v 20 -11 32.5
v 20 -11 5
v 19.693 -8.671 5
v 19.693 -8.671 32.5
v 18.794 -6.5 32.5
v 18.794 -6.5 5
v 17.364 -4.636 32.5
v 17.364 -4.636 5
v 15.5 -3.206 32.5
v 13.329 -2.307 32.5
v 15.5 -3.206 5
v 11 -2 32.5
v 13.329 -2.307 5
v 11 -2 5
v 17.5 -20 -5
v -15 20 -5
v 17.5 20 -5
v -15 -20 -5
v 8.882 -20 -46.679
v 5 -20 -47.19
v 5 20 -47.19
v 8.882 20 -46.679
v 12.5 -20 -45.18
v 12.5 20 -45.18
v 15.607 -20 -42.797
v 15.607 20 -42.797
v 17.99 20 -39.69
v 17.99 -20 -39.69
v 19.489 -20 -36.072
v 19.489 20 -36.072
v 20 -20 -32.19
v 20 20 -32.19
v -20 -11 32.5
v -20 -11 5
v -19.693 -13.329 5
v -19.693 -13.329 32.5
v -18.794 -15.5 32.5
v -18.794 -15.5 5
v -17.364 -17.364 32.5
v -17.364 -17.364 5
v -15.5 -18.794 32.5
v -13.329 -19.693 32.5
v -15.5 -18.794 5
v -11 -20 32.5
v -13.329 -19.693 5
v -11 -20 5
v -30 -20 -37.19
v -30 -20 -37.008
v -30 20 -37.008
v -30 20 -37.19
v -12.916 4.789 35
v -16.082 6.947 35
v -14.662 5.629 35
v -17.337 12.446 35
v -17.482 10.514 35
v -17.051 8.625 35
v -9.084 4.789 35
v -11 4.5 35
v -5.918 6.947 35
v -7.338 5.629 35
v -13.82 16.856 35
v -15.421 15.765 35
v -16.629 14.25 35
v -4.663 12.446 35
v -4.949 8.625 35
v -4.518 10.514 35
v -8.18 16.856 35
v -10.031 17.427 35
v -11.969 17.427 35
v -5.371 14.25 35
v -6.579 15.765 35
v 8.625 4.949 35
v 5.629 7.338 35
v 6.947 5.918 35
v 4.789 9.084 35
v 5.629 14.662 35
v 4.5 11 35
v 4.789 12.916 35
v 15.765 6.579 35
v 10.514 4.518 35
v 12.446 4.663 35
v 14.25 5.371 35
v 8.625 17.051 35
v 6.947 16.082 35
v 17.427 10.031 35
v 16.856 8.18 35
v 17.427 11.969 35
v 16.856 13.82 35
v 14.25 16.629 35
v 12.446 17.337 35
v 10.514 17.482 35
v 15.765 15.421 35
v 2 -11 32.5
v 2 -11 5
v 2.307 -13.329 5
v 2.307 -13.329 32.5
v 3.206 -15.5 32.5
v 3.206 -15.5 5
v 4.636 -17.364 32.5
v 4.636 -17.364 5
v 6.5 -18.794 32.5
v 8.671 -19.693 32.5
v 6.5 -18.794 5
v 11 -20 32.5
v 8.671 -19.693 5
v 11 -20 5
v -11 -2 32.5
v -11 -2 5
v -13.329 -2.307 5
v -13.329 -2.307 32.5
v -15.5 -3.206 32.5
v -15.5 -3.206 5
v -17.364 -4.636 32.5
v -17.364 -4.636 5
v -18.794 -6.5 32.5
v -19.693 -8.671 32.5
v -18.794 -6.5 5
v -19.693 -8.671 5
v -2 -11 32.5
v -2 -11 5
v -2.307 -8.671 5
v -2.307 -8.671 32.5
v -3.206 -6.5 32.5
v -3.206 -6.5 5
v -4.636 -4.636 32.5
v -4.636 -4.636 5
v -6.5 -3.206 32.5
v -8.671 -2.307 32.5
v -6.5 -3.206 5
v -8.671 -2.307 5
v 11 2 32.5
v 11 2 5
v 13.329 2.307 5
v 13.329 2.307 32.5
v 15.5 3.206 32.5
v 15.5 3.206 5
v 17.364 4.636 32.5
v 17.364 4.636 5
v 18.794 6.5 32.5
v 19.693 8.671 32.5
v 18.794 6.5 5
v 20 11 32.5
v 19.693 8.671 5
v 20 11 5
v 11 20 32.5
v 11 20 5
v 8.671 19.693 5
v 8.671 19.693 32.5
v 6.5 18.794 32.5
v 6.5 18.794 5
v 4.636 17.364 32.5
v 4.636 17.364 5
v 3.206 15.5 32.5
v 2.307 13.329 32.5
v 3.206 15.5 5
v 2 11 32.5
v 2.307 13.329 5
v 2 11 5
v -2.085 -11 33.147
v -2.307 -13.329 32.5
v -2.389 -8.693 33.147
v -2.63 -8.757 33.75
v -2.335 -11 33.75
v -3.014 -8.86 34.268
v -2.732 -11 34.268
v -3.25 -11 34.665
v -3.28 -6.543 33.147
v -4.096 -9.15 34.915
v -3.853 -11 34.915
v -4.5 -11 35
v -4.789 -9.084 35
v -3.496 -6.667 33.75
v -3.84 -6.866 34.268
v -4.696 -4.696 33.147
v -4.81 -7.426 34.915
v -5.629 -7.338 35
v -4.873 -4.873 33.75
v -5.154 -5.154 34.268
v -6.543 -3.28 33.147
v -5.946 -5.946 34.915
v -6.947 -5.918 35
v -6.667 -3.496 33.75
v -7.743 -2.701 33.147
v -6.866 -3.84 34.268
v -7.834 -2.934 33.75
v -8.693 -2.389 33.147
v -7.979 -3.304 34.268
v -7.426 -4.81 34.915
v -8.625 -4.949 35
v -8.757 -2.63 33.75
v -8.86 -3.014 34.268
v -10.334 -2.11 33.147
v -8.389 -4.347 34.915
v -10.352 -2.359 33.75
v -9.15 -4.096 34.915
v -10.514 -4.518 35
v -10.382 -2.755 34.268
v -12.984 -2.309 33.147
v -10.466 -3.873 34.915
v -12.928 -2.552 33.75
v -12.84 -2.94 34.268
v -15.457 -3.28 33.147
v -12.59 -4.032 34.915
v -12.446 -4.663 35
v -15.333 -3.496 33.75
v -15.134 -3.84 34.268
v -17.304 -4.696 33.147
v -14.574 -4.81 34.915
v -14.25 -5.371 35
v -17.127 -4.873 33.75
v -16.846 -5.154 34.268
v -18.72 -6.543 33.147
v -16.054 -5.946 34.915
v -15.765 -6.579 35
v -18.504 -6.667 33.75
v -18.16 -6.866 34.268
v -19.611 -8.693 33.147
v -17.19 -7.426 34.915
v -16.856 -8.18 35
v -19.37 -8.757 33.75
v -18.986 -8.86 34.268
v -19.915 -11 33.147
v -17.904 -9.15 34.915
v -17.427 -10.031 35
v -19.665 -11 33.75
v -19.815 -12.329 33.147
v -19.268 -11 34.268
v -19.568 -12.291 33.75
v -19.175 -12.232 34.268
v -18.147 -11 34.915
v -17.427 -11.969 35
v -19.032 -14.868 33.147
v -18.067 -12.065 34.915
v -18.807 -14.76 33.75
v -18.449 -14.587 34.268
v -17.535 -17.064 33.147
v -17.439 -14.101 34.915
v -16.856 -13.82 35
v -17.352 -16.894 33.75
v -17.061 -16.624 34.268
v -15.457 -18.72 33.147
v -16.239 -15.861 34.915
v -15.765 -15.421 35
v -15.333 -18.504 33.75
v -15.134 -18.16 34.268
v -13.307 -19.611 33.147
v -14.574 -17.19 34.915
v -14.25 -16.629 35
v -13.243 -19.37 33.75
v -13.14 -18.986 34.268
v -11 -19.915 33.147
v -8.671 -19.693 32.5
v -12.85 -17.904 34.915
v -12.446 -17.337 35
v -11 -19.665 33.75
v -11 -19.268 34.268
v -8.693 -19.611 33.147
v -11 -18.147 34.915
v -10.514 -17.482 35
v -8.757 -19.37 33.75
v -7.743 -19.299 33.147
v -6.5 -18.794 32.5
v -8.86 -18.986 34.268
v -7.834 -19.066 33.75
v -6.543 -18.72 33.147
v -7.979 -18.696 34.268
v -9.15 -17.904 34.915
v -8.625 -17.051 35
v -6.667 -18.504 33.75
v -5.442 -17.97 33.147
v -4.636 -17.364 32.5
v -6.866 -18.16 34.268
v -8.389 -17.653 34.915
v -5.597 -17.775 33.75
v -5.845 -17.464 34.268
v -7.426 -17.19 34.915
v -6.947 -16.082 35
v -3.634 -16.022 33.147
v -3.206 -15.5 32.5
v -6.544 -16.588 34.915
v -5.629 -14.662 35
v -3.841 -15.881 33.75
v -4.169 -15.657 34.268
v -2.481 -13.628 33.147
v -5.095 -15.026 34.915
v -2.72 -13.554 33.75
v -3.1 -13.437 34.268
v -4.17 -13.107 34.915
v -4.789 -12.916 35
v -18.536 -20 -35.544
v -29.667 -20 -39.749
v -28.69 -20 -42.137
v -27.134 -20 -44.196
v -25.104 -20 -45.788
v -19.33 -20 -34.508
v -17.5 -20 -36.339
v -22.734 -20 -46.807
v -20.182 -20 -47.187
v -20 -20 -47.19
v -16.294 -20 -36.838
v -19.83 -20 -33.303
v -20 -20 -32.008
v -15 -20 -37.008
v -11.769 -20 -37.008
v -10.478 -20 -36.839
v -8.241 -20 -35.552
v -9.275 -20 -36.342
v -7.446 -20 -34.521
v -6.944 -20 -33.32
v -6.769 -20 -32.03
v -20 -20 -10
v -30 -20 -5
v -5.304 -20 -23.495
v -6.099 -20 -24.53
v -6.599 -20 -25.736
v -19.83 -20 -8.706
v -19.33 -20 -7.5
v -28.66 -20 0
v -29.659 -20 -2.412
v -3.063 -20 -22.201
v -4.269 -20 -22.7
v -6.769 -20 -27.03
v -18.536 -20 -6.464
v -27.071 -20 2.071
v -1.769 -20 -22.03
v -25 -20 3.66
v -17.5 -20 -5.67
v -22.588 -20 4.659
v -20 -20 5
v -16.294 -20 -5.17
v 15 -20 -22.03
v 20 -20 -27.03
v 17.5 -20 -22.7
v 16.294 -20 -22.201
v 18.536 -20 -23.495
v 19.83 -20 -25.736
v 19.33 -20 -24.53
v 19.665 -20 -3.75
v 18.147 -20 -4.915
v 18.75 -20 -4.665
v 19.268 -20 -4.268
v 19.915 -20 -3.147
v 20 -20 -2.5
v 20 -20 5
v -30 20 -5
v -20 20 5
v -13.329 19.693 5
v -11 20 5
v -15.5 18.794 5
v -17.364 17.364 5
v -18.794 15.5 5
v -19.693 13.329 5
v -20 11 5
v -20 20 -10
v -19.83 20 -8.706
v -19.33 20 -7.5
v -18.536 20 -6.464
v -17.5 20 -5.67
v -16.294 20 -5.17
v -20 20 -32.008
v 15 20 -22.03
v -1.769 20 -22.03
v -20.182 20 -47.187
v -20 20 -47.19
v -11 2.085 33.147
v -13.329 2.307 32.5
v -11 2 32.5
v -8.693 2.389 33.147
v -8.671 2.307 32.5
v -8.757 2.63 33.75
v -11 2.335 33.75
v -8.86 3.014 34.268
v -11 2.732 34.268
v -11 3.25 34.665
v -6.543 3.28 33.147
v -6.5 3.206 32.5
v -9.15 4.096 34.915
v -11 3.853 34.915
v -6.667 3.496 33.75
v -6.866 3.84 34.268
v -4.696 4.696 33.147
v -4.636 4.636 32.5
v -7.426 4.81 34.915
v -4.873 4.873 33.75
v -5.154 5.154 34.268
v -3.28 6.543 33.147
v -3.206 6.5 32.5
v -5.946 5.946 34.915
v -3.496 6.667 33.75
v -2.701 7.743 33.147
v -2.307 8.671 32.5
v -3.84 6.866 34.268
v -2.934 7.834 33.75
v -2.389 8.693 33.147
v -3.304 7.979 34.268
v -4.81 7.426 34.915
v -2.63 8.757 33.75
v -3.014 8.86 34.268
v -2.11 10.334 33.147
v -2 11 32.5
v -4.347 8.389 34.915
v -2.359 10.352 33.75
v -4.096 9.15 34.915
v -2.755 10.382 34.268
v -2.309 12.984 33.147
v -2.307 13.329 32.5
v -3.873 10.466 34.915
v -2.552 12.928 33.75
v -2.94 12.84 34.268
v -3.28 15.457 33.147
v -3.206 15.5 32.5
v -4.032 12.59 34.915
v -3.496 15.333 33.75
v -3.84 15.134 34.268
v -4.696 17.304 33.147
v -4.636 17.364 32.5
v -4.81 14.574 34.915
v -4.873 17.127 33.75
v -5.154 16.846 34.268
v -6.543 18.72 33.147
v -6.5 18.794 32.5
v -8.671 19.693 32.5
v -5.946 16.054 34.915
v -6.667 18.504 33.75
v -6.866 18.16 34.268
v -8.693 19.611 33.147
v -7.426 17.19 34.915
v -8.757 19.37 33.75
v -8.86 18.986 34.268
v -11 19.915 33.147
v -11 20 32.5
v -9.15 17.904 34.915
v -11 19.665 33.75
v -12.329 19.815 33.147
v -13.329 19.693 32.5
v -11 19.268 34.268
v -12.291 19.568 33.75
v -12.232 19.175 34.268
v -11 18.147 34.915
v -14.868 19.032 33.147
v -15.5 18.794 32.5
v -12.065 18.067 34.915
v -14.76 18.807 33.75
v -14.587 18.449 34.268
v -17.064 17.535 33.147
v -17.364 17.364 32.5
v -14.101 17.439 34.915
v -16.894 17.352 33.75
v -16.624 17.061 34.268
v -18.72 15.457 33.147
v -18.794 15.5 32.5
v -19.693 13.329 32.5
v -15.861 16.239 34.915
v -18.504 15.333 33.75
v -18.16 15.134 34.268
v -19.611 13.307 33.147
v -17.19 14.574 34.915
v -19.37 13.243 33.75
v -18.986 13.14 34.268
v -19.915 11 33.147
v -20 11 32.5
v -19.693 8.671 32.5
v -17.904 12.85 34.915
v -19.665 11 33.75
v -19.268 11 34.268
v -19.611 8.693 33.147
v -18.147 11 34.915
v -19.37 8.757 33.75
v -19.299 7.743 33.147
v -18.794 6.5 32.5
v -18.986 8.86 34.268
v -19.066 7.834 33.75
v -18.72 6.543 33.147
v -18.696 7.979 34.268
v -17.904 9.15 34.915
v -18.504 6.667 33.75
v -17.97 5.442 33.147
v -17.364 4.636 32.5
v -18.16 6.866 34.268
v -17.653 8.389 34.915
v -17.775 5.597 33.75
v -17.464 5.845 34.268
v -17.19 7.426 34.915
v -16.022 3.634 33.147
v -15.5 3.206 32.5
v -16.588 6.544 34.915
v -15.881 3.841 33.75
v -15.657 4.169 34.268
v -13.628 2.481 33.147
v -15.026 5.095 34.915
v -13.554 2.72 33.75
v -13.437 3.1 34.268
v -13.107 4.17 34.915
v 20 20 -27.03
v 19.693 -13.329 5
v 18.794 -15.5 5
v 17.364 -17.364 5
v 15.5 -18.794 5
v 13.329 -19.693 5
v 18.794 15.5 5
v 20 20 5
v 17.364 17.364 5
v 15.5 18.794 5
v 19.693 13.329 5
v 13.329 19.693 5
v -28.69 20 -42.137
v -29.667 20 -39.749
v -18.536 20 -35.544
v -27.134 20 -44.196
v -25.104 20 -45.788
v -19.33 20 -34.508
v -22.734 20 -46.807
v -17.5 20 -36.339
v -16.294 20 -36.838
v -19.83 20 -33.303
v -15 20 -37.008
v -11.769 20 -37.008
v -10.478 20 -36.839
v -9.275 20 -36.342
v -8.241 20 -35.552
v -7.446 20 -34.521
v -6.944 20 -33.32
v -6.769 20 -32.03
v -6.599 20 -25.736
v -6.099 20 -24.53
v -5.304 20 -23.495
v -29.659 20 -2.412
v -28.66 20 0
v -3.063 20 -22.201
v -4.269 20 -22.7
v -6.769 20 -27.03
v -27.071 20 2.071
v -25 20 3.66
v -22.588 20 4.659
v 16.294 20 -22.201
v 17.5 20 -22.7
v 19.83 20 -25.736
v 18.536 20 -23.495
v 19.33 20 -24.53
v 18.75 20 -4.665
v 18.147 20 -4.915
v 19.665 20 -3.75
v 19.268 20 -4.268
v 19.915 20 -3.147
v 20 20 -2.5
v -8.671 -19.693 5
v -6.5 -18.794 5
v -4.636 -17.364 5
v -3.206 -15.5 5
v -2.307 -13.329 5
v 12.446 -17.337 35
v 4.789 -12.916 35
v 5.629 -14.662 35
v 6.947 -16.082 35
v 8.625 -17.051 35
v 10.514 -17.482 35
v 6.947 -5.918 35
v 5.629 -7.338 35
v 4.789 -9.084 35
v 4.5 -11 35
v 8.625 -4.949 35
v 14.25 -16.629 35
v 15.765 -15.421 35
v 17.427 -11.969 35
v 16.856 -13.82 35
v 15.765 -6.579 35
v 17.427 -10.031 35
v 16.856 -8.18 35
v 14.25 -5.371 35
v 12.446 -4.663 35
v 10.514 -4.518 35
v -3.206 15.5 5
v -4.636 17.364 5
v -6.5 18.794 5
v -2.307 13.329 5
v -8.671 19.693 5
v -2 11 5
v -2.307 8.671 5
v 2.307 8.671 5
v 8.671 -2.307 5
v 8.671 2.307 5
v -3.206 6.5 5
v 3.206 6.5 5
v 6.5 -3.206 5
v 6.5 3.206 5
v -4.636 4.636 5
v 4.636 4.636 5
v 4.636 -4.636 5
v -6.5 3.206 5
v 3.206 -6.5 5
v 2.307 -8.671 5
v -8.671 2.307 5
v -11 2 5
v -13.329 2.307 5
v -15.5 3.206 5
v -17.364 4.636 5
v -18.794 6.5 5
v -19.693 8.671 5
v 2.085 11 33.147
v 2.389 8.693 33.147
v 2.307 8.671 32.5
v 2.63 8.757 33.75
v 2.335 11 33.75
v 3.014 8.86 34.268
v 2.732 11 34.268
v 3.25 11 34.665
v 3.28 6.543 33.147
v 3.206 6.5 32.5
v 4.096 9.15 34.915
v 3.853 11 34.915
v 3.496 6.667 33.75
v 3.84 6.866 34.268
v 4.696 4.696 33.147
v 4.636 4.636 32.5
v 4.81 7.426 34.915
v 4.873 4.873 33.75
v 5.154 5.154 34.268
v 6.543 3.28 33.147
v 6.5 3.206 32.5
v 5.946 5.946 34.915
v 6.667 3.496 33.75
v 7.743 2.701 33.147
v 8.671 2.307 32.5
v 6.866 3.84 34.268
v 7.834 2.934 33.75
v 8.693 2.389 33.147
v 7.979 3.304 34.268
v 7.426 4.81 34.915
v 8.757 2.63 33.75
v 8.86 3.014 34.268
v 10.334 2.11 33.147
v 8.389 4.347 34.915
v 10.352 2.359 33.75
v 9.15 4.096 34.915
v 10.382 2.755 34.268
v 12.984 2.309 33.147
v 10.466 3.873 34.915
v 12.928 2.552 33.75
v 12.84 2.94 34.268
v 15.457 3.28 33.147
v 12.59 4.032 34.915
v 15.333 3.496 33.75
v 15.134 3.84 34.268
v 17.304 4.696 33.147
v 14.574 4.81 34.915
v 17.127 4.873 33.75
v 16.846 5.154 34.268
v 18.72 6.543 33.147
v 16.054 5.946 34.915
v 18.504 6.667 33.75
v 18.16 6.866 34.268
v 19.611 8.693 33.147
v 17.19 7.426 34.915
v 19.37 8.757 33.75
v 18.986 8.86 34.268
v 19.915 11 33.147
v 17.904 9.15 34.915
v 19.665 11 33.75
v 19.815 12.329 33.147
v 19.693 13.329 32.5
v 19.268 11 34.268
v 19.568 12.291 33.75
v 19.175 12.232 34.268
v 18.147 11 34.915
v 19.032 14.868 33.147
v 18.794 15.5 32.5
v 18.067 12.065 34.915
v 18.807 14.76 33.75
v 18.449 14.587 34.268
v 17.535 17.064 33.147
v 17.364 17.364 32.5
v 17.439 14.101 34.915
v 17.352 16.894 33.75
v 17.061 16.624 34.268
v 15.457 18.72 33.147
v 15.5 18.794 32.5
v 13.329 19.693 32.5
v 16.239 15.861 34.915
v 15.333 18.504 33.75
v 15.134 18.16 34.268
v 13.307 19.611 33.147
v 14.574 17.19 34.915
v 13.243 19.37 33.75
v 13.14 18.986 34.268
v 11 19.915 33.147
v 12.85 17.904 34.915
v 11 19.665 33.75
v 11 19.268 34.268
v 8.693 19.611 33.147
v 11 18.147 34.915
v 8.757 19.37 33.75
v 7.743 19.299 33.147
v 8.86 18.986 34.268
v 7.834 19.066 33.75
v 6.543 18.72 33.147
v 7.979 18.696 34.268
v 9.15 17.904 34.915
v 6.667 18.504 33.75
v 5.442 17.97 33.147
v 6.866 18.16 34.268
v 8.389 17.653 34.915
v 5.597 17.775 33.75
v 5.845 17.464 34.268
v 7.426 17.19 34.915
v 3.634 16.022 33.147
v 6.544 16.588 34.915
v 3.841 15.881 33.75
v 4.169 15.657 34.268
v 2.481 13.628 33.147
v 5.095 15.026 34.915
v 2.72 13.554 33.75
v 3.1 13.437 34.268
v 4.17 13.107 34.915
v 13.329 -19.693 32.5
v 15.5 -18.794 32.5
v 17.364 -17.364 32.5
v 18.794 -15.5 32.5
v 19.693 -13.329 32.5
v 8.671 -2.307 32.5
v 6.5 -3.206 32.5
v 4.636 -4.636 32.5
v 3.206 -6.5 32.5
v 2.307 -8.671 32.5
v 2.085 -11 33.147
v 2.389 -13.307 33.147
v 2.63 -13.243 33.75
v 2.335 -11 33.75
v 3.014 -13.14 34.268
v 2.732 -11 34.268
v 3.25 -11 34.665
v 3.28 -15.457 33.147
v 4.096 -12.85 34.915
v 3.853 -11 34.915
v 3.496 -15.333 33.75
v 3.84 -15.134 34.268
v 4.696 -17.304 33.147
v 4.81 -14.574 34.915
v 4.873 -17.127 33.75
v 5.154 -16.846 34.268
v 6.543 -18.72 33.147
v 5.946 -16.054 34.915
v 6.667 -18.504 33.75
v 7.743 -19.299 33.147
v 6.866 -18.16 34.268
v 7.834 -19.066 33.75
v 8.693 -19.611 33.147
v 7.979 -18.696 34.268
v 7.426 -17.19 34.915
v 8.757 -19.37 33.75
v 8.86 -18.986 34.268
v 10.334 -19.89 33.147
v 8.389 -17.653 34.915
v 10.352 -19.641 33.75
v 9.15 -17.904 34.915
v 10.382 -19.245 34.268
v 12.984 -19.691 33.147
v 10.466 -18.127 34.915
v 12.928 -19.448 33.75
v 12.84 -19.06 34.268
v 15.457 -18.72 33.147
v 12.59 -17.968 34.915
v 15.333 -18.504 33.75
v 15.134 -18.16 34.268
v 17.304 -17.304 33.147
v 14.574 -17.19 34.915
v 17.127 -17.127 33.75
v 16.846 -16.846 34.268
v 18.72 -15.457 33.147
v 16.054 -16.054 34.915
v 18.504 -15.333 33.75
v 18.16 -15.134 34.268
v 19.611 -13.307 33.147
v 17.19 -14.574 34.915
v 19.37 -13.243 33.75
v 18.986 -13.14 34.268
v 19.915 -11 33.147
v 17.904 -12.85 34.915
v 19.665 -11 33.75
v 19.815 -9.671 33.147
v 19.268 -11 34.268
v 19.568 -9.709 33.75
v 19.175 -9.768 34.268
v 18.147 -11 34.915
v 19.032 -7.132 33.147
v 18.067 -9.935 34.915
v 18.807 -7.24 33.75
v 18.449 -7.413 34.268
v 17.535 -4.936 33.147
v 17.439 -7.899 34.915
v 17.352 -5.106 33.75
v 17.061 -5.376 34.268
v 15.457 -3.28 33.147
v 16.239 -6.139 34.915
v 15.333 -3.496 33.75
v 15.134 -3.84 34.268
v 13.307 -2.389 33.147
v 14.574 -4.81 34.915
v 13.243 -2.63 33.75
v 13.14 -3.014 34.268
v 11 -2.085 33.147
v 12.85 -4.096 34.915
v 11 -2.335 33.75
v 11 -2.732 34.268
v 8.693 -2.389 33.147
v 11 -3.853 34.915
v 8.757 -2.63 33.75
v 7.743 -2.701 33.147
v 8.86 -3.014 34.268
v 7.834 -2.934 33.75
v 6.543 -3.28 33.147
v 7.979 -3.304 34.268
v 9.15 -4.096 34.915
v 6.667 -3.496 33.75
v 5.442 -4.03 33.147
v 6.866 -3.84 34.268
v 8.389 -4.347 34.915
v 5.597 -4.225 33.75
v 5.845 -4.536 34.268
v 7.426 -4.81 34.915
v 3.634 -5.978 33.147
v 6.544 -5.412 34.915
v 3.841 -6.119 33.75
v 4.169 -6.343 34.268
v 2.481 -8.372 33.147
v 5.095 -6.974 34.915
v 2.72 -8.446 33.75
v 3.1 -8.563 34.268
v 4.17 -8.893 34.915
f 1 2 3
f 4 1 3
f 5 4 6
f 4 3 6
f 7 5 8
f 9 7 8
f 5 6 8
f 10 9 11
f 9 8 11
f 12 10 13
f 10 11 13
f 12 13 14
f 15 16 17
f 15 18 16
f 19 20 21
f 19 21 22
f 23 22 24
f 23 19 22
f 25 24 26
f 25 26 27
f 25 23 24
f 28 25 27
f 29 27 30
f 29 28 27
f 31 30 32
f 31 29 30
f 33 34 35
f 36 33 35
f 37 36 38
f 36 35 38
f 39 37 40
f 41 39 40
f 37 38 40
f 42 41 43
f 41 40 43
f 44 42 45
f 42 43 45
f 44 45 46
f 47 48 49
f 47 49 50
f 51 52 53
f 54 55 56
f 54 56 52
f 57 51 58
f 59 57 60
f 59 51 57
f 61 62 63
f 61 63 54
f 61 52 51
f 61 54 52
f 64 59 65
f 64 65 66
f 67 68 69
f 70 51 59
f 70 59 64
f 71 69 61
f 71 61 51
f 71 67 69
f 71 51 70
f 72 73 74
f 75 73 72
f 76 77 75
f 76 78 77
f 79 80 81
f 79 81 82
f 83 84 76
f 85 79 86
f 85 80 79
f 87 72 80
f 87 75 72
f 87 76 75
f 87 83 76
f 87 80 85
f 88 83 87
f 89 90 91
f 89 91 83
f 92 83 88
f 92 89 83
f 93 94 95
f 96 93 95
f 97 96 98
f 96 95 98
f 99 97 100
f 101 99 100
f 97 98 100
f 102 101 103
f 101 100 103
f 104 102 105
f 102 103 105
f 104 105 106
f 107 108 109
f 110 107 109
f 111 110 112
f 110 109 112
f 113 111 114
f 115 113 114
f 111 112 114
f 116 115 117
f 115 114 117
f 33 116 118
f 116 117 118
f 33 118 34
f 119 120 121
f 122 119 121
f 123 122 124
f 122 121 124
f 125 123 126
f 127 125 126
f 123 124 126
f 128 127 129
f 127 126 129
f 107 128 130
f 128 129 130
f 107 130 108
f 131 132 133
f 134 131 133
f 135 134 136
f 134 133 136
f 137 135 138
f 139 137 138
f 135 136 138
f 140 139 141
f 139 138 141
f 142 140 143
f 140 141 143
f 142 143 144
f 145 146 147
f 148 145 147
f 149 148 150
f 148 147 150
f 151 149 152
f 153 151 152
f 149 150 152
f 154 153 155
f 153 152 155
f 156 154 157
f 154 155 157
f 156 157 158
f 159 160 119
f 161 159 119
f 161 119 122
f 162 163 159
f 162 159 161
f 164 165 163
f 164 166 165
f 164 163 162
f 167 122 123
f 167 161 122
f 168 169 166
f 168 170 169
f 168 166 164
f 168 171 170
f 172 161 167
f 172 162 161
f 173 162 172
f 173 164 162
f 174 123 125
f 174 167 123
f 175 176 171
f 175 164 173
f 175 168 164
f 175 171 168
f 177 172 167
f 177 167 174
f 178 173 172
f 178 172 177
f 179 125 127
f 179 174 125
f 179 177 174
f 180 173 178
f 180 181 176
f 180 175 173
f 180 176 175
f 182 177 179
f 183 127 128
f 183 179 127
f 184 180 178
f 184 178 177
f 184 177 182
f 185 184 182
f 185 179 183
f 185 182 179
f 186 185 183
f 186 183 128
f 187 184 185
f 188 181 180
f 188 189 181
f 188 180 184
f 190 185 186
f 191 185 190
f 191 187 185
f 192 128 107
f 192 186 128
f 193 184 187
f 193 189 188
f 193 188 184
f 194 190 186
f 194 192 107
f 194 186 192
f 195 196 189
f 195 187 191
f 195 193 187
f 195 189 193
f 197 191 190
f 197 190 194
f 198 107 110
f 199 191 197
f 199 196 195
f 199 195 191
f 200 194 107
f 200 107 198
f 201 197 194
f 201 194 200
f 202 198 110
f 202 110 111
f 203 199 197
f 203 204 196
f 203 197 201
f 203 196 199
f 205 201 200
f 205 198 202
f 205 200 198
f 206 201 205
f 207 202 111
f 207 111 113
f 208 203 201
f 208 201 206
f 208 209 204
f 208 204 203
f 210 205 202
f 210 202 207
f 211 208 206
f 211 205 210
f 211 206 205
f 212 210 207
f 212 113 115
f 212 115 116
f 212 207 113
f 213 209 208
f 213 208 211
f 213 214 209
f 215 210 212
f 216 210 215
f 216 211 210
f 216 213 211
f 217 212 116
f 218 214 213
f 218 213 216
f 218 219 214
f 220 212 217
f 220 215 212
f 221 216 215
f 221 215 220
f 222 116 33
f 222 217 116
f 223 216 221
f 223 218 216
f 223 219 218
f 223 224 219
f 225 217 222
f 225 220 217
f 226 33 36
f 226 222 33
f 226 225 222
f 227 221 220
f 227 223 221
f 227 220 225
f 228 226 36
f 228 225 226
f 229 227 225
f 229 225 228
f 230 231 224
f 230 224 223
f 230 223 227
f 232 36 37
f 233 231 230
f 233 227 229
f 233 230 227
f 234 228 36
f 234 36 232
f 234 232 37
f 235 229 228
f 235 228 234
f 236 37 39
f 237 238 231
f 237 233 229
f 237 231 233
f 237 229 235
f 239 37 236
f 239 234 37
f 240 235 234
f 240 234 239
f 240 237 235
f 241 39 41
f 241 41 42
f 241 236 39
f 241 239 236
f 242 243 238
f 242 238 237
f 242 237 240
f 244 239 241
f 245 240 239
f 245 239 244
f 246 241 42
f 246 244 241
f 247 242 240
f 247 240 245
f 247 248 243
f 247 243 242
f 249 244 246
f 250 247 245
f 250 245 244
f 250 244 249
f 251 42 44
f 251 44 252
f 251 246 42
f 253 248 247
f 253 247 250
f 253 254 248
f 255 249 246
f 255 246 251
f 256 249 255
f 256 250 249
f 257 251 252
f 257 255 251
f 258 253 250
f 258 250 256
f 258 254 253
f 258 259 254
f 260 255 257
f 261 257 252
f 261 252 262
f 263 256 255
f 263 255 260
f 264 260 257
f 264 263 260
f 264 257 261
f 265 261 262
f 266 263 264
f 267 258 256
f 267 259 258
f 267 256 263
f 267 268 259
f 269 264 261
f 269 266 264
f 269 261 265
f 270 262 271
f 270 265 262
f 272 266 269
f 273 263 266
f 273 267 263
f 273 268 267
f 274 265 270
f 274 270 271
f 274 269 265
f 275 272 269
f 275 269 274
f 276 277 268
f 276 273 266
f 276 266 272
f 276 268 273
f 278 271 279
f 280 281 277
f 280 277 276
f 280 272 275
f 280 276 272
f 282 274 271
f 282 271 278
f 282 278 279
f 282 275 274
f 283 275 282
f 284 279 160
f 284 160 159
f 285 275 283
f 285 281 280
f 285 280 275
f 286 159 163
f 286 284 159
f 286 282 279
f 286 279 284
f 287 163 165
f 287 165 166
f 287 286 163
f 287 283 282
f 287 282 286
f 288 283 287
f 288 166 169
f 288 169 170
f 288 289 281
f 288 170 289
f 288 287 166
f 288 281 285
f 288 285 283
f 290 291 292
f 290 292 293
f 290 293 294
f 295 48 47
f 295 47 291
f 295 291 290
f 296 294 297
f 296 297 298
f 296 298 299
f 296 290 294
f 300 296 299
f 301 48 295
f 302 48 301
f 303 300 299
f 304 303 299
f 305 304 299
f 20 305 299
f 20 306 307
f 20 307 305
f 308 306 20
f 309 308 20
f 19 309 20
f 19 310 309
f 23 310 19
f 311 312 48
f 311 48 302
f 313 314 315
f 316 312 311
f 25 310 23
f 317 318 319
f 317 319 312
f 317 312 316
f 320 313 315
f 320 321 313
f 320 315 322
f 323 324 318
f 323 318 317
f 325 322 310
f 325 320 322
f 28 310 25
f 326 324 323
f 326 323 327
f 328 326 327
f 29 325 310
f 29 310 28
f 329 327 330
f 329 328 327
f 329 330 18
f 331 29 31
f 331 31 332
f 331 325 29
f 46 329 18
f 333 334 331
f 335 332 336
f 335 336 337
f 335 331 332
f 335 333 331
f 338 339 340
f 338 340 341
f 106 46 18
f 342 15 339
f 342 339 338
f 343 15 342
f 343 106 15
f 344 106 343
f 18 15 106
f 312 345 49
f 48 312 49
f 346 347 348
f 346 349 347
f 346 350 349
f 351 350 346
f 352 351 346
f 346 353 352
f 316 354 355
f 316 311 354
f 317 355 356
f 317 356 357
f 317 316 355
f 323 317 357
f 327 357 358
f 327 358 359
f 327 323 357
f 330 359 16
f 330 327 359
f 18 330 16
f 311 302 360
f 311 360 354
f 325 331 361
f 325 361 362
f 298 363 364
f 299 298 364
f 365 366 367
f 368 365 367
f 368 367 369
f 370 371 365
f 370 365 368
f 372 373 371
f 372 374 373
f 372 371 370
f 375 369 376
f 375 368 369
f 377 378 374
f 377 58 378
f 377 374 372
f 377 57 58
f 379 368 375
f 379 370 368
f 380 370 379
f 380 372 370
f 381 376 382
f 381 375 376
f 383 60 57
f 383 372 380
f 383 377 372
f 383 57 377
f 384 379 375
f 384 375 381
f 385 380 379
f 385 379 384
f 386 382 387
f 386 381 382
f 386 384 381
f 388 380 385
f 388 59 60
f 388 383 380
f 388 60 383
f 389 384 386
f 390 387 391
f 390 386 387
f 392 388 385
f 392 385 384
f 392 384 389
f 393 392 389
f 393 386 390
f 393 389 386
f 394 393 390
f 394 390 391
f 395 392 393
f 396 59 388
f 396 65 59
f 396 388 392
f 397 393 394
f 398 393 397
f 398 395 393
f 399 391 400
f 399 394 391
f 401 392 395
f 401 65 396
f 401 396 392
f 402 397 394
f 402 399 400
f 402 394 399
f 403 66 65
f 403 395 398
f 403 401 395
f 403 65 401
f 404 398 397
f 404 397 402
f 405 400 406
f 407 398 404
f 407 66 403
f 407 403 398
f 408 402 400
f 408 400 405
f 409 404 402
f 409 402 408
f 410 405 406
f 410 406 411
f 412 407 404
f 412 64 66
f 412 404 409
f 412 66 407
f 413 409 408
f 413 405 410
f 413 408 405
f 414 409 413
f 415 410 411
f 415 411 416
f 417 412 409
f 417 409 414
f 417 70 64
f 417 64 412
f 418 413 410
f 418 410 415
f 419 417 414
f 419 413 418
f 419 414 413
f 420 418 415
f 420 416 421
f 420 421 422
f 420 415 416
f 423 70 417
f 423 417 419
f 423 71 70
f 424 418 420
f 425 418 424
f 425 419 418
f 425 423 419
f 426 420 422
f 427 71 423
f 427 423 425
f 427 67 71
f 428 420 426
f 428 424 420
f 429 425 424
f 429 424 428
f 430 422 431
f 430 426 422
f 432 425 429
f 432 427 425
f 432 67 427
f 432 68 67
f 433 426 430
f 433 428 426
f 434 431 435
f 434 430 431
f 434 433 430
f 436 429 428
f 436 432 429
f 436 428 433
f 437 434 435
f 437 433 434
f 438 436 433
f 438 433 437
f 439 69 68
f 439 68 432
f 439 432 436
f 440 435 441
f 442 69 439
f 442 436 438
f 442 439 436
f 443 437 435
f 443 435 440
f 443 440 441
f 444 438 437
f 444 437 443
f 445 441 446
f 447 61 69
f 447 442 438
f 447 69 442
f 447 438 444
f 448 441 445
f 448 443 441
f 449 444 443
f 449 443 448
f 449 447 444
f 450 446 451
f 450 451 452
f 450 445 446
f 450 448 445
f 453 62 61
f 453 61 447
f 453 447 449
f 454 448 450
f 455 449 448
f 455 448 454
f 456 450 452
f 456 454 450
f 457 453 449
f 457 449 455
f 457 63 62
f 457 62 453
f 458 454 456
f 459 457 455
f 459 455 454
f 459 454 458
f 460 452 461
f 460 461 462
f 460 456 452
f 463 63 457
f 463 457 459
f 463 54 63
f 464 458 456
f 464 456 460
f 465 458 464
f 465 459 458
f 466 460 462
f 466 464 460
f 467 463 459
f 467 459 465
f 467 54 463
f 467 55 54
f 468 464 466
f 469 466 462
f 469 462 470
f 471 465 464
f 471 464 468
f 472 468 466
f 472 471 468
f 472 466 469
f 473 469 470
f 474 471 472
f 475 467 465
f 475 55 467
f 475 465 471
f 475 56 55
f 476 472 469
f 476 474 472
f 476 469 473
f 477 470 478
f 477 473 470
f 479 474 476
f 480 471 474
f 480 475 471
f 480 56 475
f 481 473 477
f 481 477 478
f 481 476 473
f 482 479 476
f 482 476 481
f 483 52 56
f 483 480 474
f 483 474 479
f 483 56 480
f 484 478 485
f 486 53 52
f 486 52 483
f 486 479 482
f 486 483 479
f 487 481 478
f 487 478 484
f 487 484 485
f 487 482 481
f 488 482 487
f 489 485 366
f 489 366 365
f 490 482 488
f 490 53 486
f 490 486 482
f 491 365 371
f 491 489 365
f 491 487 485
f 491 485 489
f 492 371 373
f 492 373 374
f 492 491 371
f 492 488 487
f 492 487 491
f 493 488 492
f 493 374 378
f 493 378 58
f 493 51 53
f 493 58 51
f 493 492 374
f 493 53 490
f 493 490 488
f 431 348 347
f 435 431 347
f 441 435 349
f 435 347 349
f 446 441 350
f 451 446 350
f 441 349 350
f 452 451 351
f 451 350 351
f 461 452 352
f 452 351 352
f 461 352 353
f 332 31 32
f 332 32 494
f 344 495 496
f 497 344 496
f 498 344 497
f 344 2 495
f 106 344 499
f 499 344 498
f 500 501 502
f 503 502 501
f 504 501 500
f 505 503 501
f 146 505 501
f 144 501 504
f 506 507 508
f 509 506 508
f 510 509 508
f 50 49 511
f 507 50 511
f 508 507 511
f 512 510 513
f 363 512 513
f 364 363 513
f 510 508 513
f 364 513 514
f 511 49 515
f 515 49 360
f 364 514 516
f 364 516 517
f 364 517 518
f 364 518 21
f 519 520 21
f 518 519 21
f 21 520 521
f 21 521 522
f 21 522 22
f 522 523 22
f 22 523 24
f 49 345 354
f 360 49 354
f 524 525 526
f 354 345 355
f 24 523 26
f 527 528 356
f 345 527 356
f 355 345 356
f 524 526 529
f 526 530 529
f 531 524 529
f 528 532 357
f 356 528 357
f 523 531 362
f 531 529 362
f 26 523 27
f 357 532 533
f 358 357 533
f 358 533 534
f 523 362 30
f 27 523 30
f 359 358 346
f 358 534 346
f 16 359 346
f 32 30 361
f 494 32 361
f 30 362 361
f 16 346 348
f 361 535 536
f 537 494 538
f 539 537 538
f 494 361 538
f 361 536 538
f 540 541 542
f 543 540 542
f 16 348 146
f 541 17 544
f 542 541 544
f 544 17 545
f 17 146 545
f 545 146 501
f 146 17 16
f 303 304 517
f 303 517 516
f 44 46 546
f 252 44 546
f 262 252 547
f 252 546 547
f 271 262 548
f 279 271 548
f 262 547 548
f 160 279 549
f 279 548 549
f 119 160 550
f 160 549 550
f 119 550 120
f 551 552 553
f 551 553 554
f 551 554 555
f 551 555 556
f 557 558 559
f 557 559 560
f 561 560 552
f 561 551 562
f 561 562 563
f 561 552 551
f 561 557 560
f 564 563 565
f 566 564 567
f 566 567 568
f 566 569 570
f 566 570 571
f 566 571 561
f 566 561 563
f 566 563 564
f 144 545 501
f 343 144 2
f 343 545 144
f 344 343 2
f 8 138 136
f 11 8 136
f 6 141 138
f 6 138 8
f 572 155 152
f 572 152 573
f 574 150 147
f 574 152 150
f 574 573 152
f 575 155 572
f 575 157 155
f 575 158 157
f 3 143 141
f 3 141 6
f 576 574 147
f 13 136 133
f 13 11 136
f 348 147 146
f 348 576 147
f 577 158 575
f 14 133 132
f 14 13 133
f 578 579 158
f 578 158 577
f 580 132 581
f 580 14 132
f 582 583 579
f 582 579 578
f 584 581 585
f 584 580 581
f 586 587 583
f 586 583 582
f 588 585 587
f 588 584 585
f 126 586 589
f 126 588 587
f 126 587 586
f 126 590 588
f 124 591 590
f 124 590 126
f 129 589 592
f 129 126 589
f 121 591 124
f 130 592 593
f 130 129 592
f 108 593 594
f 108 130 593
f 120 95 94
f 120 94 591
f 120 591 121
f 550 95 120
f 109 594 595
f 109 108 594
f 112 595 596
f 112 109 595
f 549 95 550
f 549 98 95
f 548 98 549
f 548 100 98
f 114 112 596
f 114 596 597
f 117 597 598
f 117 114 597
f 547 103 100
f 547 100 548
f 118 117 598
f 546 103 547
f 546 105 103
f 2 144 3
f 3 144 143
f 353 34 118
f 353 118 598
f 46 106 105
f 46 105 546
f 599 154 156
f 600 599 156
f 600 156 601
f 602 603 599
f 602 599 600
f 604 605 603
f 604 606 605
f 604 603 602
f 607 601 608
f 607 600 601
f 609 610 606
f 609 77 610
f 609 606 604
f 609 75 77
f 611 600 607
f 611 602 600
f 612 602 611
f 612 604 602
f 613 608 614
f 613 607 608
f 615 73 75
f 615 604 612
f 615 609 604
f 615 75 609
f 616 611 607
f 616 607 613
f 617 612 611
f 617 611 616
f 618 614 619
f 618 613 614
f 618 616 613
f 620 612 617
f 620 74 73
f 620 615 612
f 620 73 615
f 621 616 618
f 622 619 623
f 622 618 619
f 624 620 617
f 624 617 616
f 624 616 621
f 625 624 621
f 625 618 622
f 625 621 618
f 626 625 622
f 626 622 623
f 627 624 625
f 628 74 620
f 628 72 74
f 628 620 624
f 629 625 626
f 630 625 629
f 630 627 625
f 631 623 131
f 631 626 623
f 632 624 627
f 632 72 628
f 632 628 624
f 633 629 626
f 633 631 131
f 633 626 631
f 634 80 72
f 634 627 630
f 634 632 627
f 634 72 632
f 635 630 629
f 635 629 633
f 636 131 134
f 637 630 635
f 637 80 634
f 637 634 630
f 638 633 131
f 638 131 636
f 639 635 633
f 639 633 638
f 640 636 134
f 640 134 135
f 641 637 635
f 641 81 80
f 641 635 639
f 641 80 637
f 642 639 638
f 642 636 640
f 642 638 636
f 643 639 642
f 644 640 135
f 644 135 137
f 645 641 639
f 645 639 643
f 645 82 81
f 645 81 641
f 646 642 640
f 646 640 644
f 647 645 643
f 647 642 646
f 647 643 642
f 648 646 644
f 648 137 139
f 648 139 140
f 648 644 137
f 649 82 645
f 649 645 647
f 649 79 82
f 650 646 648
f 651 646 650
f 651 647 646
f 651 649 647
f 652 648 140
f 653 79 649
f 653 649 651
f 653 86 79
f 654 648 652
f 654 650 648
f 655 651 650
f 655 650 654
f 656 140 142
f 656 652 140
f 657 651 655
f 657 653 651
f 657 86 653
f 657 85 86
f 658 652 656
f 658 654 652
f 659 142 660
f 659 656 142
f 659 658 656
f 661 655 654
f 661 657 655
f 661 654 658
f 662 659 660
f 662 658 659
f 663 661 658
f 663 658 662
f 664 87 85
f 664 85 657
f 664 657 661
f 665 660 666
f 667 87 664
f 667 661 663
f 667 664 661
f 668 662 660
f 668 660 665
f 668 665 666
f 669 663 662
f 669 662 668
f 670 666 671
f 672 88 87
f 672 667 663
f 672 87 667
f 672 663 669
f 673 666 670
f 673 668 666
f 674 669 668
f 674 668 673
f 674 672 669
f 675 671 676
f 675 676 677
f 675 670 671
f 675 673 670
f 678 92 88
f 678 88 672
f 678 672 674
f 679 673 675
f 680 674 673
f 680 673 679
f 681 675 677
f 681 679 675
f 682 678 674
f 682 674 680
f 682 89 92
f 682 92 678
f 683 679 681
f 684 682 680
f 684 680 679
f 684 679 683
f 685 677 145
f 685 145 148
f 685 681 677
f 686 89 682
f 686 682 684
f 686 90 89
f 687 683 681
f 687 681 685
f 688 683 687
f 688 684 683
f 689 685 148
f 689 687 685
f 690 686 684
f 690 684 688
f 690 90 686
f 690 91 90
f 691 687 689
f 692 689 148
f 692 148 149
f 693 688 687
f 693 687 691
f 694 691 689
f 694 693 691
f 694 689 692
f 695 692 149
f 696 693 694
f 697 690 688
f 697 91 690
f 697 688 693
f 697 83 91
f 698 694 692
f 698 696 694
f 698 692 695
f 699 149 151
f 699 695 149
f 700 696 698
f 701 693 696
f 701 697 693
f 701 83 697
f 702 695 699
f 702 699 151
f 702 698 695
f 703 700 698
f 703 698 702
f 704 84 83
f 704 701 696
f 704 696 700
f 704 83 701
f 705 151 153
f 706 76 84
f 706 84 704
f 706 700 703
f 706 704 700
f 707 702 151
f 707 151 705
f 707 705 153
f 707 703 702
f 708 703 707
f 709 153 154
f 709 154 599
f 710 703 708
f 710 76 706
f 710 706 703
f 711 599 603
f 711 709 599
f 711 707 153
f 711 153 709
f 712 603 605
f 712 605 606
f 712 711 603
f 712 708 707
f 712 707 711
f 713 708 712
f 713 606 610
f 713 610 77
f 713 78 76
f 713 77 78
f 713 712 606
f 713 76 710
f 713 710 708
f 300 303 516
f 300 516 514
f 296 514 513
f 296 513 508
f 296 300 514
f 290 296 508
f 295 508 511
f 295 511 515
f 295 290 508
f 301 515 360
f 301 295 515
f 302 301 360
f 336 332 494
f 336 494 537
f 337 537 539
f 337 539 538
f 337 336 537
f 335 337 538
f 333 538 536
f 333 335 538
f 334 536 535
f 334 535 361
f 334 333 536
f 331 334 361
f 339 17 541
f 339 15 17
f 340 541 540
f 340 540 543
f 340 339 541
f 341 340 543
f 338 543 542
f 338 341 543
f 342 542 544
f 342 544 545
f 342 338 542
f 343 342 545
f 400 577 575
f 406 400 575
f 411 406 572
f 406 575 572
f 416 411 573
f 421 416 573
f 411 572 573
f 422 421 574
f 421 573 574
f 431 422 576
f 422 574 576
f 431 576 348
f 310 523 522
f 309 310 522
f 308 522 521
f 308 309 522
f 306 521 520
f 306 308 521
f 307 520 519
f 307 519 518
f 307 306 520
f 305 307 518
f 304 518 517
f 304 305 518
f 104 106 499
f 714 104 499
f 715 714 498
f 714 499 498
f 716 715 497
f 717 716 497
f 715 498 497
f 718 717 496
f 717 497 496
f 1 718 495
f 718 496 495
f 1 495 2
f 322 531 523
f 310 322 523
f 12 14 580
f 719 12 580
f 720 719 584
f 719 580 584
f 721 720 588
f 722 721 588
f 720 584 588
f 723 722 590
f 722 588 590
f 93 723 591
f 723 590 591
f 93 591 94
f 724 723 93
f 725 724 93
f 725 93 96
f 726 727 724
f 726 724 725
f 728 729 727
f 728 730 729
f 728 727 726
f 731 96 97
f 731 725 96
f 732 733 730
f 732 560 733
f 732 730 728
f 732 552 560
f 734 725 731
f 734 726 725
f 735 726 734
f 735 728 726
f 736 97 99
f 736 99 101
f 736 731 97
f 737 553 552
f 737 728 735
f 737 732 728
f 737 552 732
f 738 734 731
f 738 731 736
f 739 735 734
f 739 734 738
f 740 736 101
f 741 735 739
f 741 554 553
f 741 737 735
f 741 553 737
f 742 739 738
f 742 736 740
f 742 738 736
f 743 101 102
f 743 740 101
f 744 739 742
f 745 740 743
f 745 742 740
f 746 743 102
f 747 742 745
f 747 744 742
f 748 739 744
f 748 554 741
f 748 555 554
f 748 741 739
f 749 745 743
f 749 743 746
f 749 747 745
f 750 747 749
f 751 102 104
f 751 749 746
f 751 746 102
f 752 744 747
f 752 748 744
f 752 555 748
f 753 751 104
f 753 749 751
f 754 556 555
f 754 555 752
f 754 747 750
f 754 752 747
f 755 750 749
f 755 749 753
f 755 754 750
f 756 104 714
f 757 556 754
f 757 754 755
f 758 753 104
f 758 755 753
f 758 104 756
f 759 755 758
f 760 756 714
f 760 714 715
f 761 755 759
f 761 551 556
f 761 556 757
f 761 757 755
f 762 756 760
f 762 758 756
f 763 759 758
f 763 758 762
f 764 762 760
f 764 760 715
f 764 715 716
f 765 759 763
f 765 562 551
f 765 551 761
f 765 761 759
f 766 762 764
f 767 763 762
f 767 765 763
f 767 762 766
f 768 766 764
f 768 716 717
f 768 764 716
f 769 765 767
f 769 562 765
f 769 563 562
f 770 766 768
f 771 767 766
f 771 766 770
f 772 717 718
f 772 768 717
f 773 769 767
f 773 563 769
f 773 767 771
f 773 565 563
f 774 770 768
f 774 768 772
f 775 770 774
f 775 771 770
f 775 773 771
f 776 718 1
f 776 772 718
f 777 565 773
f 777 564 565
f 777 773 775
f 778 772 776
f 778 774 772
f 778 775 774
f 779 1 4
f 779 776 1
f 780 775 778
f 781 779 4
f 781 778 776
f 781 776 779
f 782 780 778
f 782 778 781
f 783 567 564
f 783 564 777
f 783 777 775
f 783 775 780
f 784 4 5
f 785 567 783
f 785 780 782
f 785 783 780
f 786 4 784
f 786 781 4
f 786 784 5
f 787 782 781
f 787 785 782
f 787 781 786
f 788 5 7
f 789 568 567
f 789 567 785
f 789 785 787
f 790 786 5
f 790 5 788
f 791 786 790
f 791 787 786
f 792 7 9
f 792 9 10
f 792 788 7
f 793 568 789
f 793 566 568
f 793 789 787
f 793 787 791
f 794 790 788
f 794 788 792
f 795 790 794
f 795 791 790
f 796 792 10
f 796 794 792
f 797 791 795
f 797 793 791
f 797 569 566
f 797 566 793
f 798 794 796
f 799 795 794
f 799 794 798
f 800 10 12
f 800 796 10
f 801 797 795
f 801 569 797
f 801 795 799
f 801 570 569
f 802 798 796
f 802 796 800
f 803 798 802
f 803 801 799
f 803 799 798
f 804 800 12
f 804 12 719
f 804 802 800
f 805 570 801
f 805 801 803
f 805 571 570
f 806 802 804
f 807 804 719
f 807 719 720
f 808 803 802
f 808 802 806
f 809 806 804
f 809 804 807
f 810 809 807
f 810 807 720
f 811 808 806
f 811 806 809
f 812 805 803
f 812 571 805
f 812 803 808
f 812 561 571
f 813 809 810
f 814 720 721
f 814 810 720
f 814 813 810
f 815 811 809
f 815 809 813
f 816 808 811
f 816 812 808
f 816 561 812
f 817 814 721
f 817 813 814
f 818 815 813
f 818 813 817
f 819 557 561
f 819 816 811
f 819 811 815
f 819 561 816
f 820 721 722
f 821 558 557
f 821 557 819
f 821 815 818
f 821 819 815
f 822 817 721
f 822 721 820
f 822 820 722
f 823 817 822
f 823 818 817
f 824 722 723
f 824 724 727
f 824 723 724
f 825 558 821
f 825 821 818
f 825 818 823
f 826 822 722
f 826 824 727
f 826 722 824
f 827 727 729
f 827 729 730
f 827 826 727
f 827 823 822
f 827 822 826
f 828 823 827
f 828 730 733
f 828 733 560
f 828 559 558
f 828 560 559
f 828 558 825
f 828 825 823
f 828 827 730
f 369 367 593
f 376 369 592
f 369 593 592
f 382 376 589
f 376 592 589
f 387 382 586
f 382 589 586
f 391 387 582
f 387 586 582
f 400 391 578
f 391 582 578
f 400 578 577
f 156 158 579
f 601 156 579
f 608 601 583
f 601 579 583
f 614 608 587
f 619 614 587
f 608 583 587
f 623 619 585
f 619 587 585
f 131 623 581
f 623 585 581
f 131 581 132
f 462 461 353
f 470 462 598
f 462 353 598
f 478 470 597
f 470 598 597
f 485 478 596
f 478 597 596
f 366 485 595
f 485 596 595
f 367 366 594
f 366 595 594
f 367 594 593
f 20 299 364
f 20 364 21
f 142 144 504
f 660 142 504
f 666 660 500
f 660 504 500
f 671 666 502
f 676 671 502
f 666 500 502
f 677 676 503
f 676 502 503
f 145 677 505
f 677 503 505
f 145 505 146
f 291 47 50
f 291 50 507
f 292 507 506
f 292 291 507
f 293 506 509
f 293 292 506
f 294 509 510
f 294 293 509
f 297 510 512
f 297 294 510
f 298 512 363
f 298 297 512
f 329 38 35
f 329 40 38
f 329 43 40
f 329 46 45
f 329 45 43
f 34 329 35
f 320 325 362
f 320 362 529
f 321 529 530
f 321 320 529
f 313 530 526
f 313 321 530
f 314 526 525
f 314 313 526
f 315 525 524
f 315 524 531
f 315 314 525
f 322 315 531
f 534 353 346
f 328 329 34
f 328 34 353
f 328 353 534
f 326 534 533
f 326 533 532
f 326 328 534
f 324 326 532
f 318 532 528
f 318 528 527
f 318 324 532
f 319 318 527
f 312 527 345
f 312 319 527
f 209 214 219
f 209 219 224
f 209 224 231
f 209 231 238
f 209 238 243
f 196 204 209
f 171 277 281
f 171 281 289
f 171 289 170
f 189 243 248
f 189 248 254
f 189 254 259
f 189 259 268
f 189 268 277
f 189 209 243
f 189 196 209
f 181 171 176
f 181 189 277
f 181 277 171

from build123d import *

# Parameters (mm, degrees)
F1_DEPTH = 20
F3_DEPTH = 30


# Not quite as in the source:
# - a fillet or chamfer that OpenCascade refuses, or shapes differently, is made with other operations: its cross-section is extruded or revolved along the edge and cut away or added
# - a feature names something its author has since deleted; it is built from what else it names


with BuildPart() as f1:
    # F0 (on Front) → F1 (new body, symmetric)
    with BuildSketch(Plane.XZ):
        with BuildLine():
            Line((-10, -5), (17.5, -5))
            ThreePointArc((17.5, -5), (19.267766953, -4.267766953), (20, -2.5))
            Line((20, -2.5), (20, 5))
            Line((20, 5), (-20, 5))
            ThreePointArc((-20, 5), (-27.0710678119, 2.0710678119), (-30, -5))
            Line((-30, -5), (-30, -37.0084848255))
            Line((-30, -37.0084848255), (-29.9999700785, -37.1900333921))
            ThreePointArc((-29.9999700785, -37.1900333921), (-27.134358967, -44.1955599538), (-20.1815186475, -47.1867371371))
            Line((-20.1815186475, -47.1867371371), (-20, -47.1900331229))
            Line((-20, -47.1900331229), (-10, -47.1900331229))
            Line((-10, -47.1900331229), (-6.8265195005, -47.1900331229))
            Line((-6.8265195005, -47.1900331229), (5, -47.1900331229))
            ThreePointArc((5, -47.1900331229), (15.6066017178, -42.7966348407), (20, -32.1900331229))
            Line((20, -32.1900331229), (20, -32.0304483175))
            Line((20, -32.0304483175), (20, -27.0304483175))
            ThreePointArc((20, -27.0304483175), (18.5355339059, -23.4949144116), (15, -22.0304483175))
            Line((15, -22.0304483175), (3.1734804995, -22.0304483175))
            Line((3.1734804995, -22.0304483175), (-1.7689520504, -22.0304483175))
            ThreePointArc((-1.7689520504, -22.0304483175), (-5.3044859563, -23.4949144116), (-6.7689520504, -27.0304483175))
            Line((-6.7689520504, -27.0304483175), (-6.7689520504, -32.0304483175))
            ThreePointArc((-6.7689520504, -32.0304483175), (-8.2410406124, -35.5516728412), (-11.7686128262, -37.0084848255))
            Line((-11.7686128262, -37.0084848255), (-15, -37.0084848255))
            ThreePointArc((-15, -37.0084848255), (-18.5355339059, -35.5440187314), (-20, -32.0084848255))
            Line((-20, -32.0084848255), (-20, -15))
            Line((-20, -15), (-20, -10))
            ThreePointArc((-20, -10), (-18.5355339059, -6.4644660941), (-15, -5))
            Line((-15, -5), (-10, -5))
        make_face()
    extrude(amount=F1_DEPTH, both=True)

    # F2 (on face) → F3 (join)
    with BuildSketch(Plane.XY.offset(5)):
        with BuildLine():
            Line((-11, 11), (-2, 11))
            ThreePointArc((-2, 11), (-4.6360389693, 17.3639610307), (-11, 20))
            Line((-11, 20), (-11, 11))
        make_face()
        with BuildLine():
            Line((-20, 11), (-11, 11))
            Line((-11, 11), (-11, 20))
            ThreePointArc((-11, 20), (-17.3639610307, 17.3639610307), (-20, 11))
        make_face()
        with BuildLine():
            ThreePointArc((-20, 11), (-17.3639610288, 4.6360389675), (-10.9999999948, 2))
            Line((-11, 2), (-11, 11))
            Line((-11, 11), (-20, 11))
        make_face()
        with BuildLine():
            Line((-11, 11), (-11, 2))
            ThreePointArc((-10.9999999948, 2), (-4.6360389675, 4.6360389712), (-2, 11))
            Line((-2, 11), (-11, 11))
        make_face()
        with BuildLine():
            ThreePointArc((11, 20), (4.6360389693, 17.3639610307), (2, 11))
            Line((2, 11), (11, 11))
            Line((11, 11), (11, 20))
        make_face()
        with BuildLine():
            Line((11, 20), (11, 11))
            Line((11, 11), (20, 11))
            ThreePointArc((20, 11), (17.3639610307, 17.3639610307), (11, 20))
        make_face()
        with BuildLine():
            Line((11, 11), (11, 2))
            ThreePointArc((11, 2), (17.3639610307, 4.6360389693), (20, 11))
            Line((20, 11), (11, 11))
        make_face()
        with BuildLine():
            ThreePointArc((2, 11), (4.6360389693, 4.6360389693), (11, 2))
            Line((11, 2), (11, 11))
            Line((11, 11), (2, 11))
        make_face()
        with BuildLine():
            ThreePointArc((11, -2), (4.6360389693, -4.6360389693), (2, -11))
            Line((2, -11), (11, -11))
            Line((11, -11), (11, -2))
        make_face()
        with BuildLine():
            Line((11, -2), (11, -11))
            Line((11, -11), (20, -11))
            ThreePointArc((20, -11), (17.3639610307, -4.6360389693), (11, -2))
        make_face()
        with BuildLine():
            Line((11, -11), (11, -20))
            ThreePointArc((11, -20), (17.3639610307, -17.3639610307), (20, -11))
            Line((20, -11), (11, -11))
        make_face()
        with BuildLine():
            Line((11, -11), (2, -11))
            ThreePointArc((2, -11), (4.6360389693, -17.3639610307), (11, -20))
            Line((11, -20), (11, -11))
        make_face()
        with BuildLine():
            ThreePointArc((-11, -20), (-4.6360389693, -17.3639610307), (-2, -11))
            Line((-2, -11), (-11, -11))
            Line((-11, -11), (-11, -20))
        make_face()
        with BuildLine():
            ThreePointArc((-20, -11), (-17.3639610307, -17.3639610307), (-11, -20))
            Line((-11, -20), (-11, -11))
            Line((-11, -11), (-20, -11))
        make_face()
        with BuildLine():
            Line((-20, -11), (-11, -11))
            Line((-11, -11), (-11, -2))
            ThreePointArc((-11, -2), (-17.3639610307, -4.6360389693), (-20, -11))
        make_face()
        with BuildLine():
            Line((-11, -11), (-2, -11))
            ThreePointArc((-2, -11), (-4.6360389693, -4.6360389693), (-11, -2))
            Line((-11, -2), (-11, -11))
        make_face()
    extrude(amount=F3_DEPTH)

    # F4: fillet of radius 2.5 on 4 edges, made by hand

    # F4_s1 → F4_t2 (revolve, cut)
    with BuildSketch(Plane.YZ.offset(-11)):
        with BuildLine():
            ThreePointArc((2, 32.5), (2.732233047, 34.267766953), (4.5, 35))
            Line((4.5, 35), (2, 35))
            Line((2, 35), (2, 32.5))
        make_face()
    revolve(axis=Axis((-11, 11, 35), (0, 0, 1)), mode=Mode.SUBTRACT)

    # F4_s3 → F4_t4 (revolve, cut)
    with BuildSketch(Plane.XZ.offset(-11)):
        with BuildLine():
            ThreePointArc((2, 32.5), (2.732233047, 34.267766953), (4.5, 35))
            Line((4.5, 35), (2, 35))
            Line((2, 35), (2, 32.5))
        make_face()
    revolve(axis=Axis((11, 11, 35), (0, 0, 1)), mode=Mode.SUBTRACT)

    # F4_s5 → F4_t6 (revolve, cut)
    with BuildSketch(Plane.XZ.offset(11)):
        with BuildLine():
            ThreePointArc((2, 32.5), (2.732233047, 34.267766953), (4.5, 35))
            Line((4.5, 35), (2, 35))
            Line((2, 35), (2, 32.5))
        make_face()
    revolve(axis=Axis((11, -11, 35), (0, 0, 1)), mode=Mode.SUBTRACT)

    # F4_s7 → F4_t8 (revolve, cut)
    with BuildSketch(Plane.XZ.offset(11)):
        with BuildLine():
            ThreePointArc((-2, 32.5), (-2.732233047, 34.267766953), (-4.5, 35))
            Line((-4.5, 35), (-2, 35))
            Line((-2, 35), (-2, 32.5))
        make_face()
    revolve(axis=Axis((-11, -11, 35), (0, 0, 1)), mode=Mode.SUBTRACT)


solid = f1.part
